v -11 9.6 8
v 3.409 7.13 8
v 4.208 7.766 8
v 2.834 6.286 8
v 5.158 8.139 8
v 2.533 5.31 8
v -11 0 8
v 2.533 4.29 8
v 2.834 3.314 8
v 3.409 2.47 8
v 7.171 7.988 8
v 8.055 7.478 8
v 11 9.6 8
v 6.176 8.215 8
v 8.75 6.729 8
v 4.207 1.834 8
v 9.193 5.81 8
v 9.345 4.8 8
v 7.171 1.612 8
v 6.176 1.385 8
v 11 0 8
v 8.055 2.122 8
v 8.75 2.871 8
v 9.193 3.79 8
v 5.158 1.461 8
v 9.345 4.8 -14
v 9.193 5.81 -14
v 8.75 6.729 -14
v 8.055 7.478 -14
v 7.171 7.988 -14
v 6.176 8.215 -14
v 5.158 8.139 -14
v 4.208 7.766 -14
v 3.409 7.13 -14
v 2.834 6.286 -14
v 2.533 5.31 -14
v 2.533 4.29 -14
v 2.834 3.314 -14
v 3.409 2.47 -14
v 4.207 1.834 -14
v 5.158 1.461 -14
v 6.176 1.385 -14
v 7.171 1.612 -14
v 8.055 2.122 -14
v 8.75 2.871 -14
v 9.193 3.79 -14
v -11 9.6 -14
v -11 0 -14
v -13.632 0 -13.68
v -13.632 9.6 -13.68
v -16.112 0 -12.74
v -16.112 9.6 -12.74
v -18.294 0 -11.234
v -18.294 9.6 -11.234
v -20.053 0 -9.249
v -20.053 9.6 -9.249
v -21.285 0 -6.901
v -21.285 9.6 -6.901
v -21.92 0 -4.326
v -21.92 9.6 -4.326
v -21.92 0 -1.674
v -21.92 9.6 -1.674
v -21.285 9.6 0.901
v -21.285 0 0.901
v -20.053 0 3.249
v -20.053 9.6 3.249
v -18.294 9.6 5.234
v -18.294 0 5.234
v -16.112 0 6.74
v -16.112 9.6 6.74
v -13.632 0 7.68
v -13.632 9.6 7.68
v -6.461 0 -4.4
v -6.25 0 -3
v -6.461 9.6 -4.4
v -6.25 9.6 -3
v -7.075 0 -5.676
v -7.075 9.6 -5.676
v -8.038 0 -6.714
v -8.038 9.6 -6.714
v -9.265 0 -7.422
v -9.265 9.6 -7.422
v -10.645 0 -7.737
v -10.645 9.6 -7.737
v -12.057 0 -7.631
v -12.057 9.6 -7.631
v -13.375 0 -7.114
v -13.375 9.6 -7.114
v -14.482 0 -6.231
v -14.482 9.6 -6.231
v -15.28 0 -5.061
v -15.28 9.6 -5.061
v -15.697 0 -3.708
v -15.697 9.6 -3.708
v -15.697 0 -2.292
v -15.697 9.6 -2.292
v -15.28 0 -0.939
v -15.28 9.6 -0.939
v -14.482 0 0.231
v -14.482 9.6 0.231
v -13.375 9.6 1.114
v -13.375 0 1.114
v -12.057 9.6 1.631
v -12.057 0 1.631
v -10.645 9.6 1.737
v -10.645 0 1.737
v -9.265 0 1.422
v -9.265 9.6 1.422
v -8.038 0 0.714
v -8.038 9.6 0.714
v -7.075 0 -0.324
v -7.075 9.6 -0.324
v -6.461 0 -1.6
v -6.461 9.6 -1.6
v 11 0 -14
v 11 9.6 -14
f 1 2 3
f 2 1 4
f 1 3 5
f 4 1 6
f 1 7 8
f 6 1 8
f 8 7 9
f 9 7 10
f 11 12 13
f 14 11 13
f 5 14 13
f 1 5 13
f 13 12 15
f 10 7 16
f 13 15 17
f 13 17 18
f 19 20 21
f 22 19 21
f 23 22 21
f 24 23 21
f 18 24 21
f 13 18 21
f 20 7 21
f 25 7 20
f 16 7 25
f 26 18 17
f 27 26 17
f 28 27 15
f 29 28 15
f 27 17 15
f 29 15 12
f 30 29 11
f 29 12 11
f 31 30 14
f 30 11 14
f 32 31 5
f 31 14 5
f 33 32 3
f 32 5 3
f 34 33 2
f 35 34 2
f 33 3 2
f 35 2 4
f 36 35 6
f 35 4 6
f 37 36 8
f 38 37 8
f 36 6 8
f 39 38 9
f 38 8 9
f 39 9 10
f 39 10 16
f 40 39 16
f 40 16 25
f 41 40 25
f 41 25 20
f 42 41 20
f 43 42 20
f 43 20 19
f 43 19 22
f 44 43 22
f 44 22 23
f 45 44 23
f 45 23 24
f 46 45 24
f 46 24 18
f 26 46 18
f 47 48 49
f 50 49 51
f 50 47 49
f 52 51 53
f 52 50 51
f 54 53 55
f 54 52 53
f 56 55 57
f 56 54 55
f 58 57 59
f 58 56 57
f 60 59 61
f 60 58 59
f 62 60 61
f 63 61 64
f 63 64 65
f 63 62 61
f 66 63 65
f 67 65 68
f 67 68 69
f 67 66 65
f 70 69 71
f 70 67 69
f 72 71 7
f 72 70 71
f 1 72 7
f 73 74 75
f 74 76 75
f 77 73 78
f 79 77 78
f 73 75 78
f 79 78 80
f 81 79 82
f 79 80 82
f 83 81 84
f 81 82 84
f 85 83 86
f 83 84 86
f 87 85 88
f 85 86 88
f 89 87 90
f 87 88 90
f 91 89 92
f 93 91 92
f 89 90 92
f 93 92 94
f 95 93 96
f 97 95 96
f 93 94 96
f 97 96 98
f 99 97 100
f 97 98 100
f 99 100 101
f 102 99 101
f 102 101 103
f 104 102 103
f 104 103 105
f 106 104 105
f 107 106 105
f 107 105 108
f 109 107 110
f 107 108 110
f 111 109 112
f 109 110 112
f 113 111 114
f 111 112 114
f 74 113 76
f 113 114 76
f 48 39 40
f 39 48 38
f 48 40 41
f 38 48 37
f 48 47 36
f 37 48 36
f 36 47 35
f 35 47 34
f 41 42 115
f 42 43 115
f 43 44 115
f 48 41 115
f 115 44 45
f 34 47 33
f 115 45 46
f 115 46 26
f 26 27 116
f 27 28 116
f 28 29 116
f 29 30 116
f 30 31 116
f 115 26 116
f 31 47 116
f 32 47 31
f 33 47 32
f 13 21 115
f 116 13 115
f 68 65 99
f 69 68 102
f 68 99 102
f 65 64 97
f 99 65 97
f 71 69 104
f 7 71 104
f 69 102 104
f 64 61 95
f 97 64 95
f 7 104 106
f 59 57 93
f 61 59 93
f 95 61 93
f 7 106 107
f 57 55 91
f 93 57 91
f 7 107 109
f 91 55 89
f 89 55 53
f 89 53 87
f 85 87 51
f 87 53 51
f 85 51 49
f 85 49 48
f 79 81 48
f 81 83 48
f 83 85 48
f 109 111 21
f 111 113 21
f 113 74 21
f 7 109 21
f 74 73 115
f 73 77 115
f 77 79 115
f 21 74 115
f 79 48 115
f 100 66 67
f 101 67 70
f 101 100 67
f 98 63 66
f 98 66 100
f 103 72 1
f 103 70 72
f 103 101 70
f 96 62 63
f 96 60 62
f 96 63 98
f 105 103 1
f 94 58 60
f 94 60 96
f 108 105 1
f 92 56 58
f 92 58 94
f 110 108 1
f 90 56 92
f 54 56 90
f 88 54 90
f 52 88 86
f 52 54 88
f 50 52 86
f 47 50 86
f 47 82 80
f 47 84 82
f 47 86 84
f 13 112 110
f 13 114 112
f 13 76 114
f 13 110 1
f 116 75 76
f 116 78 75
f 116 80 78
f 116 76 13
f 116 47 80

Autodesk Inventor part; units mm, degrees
ref_plane "YZ Plane" through (0, 0, 0) normal (1, 0, 0) x (0, 1, 0)
ref_plane "XZ Plane" through (0, 0, 0) normal (0, 1, 0) x (-1, 0, 0)
ref_plane "XY Plane" through (0, 0, 0) normal (0, 0, 1) x (1, 0, 0)
sketch "Sketch1" plane through (0, 0, 0) normal (0, 1, 0) x (-1, 0, 0)
  line L0 (11, 8) -> (-11, 8)
  line L1 (-11, 8) -> (-11, -8)
  line L2 (-11, -8) -> (11, -8)
  line L3 (11, -8) -> (11, 8)
  line L4 (0, 0) -> (0, -8) construction
  line L5 (0, 0) -> (11, 0) construction
  dimension "d0" = 16
  dimension "d1" = 22
  dimension "d2" = 8
  dimension "d3" = 11
extrude "Extrusion1" add sketch "Sketch1" along normal blind 9.6
sketch "Sketch2" plane through (-11, 0, 8) normal (0, 0, 1) x (1, 0, 0)
  line L0 (22, 0) -> (22, 9.6) projected
  line L1 (22, 4.8) -> (16.92, 4.8) construction
  circle A0 centre (16.92, 4.8) radius 3.425
  point P0 (11, 0)
  dimension "d6" = 5.08
  dimension "d8" = 6.85
sketch "Sketch3" plane through (-11, 0, -8) normal (-1, 0, 0) x (0, 0, 1)
  point P0 (8, 0)
sketch "Sketch4" plane through (0, 9.6, 0) normal (0, 1, 0) x (1, 0, 0)
  line L0 (-11, 8) -> (-11, -8) projected
  line L1 (11, -8) -> (-11, -8)
  line L2 (-11, -8) -> (-11, 14)
  line L3 (-11, 14) -> (11, 14)
  line L4 (11, 14) -> (11, -8)
  point P0 (0, 0)
  dimension "d10" = 22
extrude "Extrusion2" add sketch "Sketch4" against normal blind 9.6
sketch "Sketch5" plane through (0, 9.6, 0) normal (0, 1, 0) x (1, 0, 0)
  line L0 (-11, -8) -> (-11, 14) projected
  circle A0 centre (-11, 3) radius 11
  point P0 (0, 0)
extrude "Extrusion3" add sketch "Sketch5" against normal blind 9.6
extrude "Extrusion4" cut sketch "Sketch2" against normal through all
sketch "Sketch6" plane through (0, 9.6, 0) normal (0, 1, 0) x (1, 0, 0)
  circle A0 centre (-11, 3) radius 6.35
  arc A1 (-11, 14) -> (-11, -8) centre (-11, 3) ccw projected
  point P0 (0, 0)
  dimension "d17" = 12.7
extrude "Extrusion5" cut sketch "Sketch6" against normal up to next
sketch "Sketch7" plane through (0, 9.6, 0) normal (0, 1, 0) x (1, 0, 0)
  circle A0 centre (-11, 3) radius 6.35 projected
  circle A1 centre (-11, 3) radius 6.35
  circle A2 centre (-11, 3) radius 4.75
  point P0 (0, 0)
  dimension "d20" = 9.5
extrude "Extrusion6" add sketch "Sketch7" against normal up to surface (9.6 mm away)
equation "\"d18\" = d17"
properties part number "Bearing O"
